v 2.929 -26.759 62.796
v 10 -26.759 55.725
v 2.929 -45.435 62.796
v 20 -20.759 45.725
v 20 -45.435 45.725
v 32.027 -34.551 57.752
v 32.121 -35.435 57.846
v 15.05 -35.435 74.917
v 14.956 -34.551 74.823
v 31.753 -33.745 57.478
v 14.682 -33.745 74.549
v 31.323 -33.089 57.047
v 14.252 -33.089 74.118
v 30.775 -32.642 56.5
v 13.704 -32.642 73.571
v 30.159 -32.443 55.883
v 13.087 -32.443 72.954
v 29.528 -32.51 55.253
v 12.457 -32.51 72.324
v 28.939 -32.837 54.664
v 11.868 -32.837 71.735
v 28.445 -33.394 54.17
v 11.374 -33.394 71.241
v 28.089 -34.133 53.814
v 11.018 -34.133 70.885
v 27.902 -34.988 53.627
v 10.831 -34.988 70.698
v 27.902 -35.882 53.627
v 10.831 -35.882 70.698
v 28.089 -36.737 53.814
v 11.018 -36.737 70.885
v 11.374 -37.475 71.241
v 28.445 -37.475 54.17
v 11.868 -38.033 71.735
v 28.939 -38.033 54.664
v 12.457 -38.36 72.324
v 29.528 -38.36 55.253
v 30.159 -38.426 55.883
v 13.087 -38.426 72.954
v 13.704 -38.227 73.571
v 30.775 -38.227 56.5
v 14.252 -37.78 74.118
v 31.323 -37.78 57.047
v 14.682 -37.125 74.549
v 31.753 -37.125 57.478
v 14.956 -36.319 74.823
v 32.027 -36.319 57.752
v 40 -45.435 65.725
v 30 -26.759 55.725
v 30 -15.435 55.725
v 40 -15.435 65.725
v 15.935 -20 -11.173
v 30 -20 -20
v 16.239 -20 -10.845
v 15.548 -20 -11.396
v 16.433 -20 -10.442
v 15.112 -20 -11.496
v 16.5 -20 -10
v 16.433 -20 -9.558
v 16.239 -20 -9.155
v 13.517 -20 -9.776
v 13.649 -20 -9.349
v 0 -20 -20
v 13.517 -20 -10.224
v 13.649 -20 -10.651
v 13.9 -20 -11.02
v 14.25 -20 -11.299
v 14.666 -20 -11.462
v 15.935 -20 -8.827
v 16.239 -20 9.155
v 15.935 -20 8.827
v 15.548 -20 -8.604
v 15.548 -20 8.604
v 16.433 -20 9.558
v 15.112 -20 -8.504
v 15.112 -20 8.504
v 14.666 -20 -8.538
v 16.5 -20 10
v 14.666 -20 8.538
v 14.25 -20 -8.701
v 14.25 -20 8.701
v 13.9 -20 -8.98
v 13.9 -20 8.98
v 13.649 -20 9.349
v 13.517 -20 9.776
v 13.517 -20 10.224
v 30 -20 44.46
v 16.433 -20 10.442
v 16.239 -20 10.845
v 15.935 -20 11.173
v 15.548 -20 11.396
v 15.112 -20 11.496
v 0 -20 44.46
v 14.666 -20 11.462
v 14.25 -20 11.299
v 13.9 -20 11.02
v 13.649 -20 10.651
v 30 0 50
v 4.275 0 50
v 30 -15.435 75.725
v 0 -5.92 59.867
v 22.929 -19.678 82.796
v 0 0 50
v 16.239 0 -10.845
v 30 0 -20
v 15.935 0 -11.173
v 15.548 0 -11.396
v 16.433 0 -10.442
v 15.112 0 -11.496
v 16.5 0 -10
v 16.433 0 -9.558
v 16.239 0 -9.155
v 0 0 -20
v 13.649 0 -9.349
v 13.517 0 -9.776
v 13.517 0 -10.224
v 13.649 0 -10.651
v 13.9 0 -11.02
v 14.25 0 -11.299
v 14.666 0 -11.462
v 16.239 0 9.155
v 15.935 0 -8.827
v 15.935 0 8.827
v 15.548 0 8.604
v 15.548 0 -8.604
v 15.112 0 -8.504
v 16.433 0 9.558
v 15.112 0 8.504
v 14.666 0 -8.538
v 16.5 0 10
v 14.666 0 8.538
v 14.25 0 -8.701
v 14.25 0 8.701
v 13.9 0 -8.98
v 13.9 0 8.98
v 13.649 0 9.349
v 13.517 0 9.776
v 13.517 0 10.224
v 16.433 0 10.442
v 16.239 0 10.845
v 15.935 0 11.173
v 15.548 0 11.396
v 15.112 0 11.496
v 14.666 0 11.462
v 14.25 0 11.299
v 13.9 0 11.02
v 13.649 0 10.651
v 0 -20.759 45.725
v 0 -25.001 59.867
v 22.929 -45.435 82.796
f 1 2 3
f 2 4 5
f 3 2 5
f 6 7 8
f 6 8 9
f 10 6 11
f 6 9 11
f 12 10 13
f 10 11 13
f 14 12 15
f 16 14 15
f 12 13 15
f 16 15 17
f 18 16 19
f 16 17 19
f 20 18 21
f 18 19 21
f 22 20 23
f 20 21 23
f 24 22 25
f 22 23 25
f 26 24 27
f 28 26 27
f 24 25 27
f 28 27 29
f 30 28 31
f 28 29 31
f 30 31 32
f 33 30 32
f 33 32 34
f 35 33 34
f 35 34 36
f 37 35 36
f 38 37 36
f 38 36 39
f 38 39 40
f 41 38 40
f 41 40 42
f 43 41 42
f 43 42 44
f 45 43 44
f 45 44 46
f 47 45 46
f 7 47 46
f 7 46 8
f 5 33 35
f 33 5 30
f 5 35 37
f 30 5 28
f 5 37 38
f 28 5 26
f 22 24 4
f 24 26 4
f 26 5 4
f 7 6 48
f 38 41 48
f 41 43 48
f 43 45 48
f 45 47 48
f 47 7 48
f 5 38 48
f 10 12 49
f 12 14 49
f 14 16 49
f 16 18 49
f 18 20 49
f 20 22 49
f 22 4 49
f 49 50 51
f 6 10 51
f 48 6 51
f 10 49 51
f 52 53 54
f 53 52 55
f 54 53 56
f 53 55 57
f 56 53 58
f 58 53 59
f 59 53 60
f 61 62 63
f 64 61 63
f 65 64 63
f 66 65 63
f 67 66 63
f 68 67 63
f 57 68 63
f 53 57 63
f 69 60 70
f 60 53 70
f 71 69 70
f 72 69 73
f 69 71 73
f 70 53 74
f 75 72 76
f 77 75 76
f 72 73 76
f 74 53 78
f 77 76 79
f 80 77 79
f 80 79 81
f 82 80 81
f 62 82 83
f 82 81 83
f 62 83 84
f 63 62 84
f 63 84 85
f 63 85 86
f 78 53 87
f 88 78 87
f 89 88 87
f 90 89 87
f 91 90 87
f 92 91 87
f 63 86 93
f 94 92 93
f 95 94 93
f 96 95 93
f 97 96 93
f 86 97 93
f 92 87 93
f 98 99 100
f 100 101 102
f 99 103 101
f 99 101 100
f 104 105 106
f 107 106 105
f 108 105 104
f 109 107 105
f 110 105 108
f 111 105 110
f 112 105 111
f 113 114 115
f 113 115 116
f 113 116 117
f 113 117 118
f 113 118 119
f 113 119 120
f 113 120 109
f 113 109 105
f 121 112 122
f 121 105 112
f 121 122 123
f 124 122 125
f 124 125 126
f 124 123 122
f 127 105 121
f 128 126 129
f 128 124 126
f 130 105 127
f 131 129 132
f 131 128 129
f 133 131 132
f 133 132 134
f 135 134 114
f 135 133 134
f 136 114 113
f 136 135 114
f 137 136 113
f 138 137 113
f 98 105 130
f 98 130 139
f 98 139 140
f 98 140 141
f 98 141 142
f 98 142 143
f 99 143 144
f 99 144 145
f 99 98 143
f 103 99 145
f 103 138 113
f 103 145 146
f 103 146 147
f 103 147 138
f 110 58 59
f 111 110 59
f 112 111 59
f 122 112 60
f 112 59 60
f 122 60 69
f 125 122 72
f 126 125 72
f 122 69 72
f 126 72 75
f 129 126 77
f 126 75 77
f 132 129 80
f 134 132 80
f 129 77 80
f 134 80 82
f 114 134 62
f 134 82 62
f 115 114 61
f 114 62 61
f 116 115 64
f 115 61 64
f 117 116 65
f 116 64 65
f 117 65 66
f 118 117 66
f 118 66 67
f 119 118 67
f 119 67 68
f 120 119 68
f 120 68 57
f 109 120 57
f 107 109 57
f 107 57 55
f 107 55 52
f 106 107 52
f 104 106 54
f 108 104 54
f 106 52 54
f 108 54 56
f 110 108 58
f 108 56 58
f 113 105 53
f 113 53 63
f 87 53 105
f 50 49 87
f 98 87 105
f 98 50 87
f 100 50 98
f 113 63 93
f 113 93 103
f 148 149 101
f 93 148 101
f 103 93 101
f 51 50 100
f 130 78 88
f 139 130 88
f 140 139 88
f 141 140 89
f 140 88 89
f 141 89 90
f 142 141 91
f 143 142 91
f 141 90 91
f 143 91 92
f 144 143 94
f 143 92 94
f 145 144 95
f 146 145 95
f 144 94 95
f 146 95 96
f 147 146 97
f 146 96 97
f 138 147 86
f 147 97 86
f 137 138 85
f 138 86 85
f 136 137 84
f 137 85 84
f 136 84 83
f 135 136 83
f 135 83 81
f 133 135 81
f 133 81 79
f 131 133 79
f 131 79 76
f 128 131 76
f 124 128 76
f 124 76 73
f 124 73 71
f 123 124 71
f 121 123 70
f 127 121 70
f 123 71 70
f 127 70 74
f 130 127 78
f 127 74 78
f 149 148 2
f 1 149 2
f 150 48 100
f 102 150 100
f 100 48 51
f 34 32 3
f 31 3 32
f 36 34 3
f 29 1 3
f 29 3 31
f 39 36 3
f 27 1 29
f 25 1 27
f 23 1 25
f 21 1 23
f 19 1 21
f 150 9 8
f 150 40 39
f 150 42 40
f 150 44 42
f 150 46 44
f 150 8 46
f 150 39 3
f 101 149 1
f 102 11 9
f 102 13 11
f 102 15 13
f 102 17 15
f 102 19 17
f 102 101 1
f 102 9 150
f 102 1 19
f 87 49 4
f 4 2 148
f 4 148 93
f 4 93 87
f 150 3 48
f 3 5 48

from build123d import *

# Parameters (mm, degrees)
SALIENTE_EXTRUIR2_DEPTH = 30
CROQUIS3_W              = 60.629420227
CROQUIS3_H              = 60.965705304
CORTAR_EXTRUIR1_DEPTH   = 30
CROQUIS4_R              = 3
CORTAR_EXTRUIR2_DEPTH   = 54.545510937
CROQUIS5_W              = 28.284271248
CROQUIS5_H              = 30
SALIENTE_EXTRUIR3_DEPTH = 14.142136
SALIENTE_EXTRUIR4_DEPTH = 10
CROQUIS7_W              = 23.581736244
CROQUIS7_H              = 30.206171788
CORTAR_EXTRUIR3_DEPTH   = 60
CROQUIS8_R              = 3
CORTAR_EXTRUIR4_DEPTH   = 71.616578937
CROQUIS10_W             = 79.072347139
CROQUIS10_H             = 56.401254602
CORTAR_EXTRUIR5_DEPTH   = 50
CROQUIS12_W             = 30
CROQUIS12_H             = 20
SALIENTE_EXTRUIR6_DEPTH = 20
CROQUIS13_R             = 1.5
CORTAR_EXTRUIR6_DEPTH   = 20


with BuildPart() as part:
    # Croquis2 → Saliente-Extruir2 (new body)
    with BuildSketch(Plane(origin=(0, 0, 0), x_dir=(0, 0, -1), z_dir=(1, 0, 0))):
        Polygon((0, 0), (-50, 0), (-75.724787771, -15.434872663), (-75.724787771, -45.434872663), (-55.724787771, -45.434872663), (-55.724787771, -26.758680242), (-44.460320701, -20), (0, -20), align=None)
    extrude(amount=SALIENTE_EXTRUIR2_DEPTH)

    # Croquis3 → Cortar-Extruir1 (cut)
    with BuildSketch(Plane(origin=(-22.862393886, 0, 22.862393886), x_dir=(0.707106781, 0, 0.707106781), z_dir=(-0.707106781, 0, 0.707106781))):
        with Locations((51.516510193, -19.86952732)):
            Rectangle(CROQUIS3_W, CROQUIS3_H)
    extrude(amount=CORTAR_EXTRUIR1_DEPTH, mode=Mode.SUBTRACT)

    # Croquis4 → Cortar-Extruir2 (cut, through all)
    with BuildSketch(Plane(origin=(-22.862393886, 0, 22.862393886), x_dir=(0.707106781, 0, 0.707106781), z_dir=(-0.707106781, 0, 0.707106781))):
        with Locations((60.616578749, -34.226076292)):
            Circle(CROQUIS4_R)
    extrude(amount=-CORTAR_EXTRUIR2_DEPTH, mode=Mode.SUBTRACT)

    # Croquis5 → Saliente-Extruir3 (add)
    with BuildSketch(Plane(origin=(-22.862393886, 0, 22.862393886), x_dir=(0.707106781, 0, 0.707106781), z_dir=(-0.707106781, 0, 0.707106781))):
        with Locations((60.616578749, -30.434872663)):
            Rectangle(CROQUIS5_W, CROQUIS5_H)
    extrude(amount=-SALIENTE_EXTRUIR3_DEPTH)

    # Croquis6 → Saliente-Extruir4 (add)
    with BuildSketch(Plane(origin=(-22.862393886, 0, 22.862393886), x_dir=(0.707106781, 0, 0.707106781), z_dir=(-0.707106781, 0, 0.707106781))):
        Polygon((32.332307501, -20.758680242), (46.474443125, -26.758680242), (46.474443125, -45.434872663), (74.758714373, -45.434872663), (74.758714373, -15.434872663), (38.378370617, 0), (32.332307501, 0), align=None)
    extrude(amount=SALIENTE_EXTRUIR4_DEPTH)

    # Croquis7 → Cortar-Extruir3 (cut)
    with BuildSketch(Plane(origin=(0, 0, 0), x_dir=(1, 0, 0), z_dir=(0, 1, 0))):
        with Locations((-11.790868122, -58.05803285)):
            Rectangle(CROQUIS7_W, CROQUIS7_H)
    extrude(amount=-CORTAR_EXTRUIR3_DEPTH, mode=Mode.SUBTRACT)

    # Croquis8 → Cortar-Extruir4 (cut, through all)
    with BuildSketch(Plane(origin=(-29.933461698, 0, 29.933461698), x_dir=(0.707106781, 0, 0.707106781), z_dir=(-0.707106781, 0, 0.707106781))):
        with Locations((60.616578749, -35.434872663)):
            Circle(CROQUIS8_R)
    extrude(amount=-CORTAR_EXTRUIR4_DEPTH, mode=Mode.SUBTRACT)

    # Croquis10 → Cortar-Extruir5 (cut)
    with BuildSketch(Plane(origin=(0, 22.058823529, 13.235294118), x_dir=(1, 0, 0), z_dir=(0, 0.857492926, 0.514495755))):
        with Locations((7.523719949, -68.590647859)):
            Rectangle(CROQUIS10_W, CROQUIS10_H)
    extrude(amount=CORTAR_EXTRUIR5_DEPTH, mode=Mode.SUBTRACT)

    # Croquis12 → Saliente-Extruir6 (add)
    with BuildSketch(Plane(origin=(0, 0, 0), x_dir=(-1, 0, 0), z_dir=(0, 0, -1))):
        with Locations((-15, -10)):
            Rectangle(CROQUIS12_W, CROQUIS12_H)
    extrude(amount=SALIENTE_EXTRUIR6_DEPTH)

    # Croquis13 → Cortar-Extruir6 (cut)
    with BuildSketch(Plane.XZ.offset(20)):
        with Locations((15, -10)):
            Circle(CROQUIS13_R)
        with Locations((15, 10)):
            Circle(CROQUIS13_R)
    extrude(amount=-CORTAR_EXTRUIR6_DEPTH, mode=Mode.SUBTRACT)


solid = part.part
